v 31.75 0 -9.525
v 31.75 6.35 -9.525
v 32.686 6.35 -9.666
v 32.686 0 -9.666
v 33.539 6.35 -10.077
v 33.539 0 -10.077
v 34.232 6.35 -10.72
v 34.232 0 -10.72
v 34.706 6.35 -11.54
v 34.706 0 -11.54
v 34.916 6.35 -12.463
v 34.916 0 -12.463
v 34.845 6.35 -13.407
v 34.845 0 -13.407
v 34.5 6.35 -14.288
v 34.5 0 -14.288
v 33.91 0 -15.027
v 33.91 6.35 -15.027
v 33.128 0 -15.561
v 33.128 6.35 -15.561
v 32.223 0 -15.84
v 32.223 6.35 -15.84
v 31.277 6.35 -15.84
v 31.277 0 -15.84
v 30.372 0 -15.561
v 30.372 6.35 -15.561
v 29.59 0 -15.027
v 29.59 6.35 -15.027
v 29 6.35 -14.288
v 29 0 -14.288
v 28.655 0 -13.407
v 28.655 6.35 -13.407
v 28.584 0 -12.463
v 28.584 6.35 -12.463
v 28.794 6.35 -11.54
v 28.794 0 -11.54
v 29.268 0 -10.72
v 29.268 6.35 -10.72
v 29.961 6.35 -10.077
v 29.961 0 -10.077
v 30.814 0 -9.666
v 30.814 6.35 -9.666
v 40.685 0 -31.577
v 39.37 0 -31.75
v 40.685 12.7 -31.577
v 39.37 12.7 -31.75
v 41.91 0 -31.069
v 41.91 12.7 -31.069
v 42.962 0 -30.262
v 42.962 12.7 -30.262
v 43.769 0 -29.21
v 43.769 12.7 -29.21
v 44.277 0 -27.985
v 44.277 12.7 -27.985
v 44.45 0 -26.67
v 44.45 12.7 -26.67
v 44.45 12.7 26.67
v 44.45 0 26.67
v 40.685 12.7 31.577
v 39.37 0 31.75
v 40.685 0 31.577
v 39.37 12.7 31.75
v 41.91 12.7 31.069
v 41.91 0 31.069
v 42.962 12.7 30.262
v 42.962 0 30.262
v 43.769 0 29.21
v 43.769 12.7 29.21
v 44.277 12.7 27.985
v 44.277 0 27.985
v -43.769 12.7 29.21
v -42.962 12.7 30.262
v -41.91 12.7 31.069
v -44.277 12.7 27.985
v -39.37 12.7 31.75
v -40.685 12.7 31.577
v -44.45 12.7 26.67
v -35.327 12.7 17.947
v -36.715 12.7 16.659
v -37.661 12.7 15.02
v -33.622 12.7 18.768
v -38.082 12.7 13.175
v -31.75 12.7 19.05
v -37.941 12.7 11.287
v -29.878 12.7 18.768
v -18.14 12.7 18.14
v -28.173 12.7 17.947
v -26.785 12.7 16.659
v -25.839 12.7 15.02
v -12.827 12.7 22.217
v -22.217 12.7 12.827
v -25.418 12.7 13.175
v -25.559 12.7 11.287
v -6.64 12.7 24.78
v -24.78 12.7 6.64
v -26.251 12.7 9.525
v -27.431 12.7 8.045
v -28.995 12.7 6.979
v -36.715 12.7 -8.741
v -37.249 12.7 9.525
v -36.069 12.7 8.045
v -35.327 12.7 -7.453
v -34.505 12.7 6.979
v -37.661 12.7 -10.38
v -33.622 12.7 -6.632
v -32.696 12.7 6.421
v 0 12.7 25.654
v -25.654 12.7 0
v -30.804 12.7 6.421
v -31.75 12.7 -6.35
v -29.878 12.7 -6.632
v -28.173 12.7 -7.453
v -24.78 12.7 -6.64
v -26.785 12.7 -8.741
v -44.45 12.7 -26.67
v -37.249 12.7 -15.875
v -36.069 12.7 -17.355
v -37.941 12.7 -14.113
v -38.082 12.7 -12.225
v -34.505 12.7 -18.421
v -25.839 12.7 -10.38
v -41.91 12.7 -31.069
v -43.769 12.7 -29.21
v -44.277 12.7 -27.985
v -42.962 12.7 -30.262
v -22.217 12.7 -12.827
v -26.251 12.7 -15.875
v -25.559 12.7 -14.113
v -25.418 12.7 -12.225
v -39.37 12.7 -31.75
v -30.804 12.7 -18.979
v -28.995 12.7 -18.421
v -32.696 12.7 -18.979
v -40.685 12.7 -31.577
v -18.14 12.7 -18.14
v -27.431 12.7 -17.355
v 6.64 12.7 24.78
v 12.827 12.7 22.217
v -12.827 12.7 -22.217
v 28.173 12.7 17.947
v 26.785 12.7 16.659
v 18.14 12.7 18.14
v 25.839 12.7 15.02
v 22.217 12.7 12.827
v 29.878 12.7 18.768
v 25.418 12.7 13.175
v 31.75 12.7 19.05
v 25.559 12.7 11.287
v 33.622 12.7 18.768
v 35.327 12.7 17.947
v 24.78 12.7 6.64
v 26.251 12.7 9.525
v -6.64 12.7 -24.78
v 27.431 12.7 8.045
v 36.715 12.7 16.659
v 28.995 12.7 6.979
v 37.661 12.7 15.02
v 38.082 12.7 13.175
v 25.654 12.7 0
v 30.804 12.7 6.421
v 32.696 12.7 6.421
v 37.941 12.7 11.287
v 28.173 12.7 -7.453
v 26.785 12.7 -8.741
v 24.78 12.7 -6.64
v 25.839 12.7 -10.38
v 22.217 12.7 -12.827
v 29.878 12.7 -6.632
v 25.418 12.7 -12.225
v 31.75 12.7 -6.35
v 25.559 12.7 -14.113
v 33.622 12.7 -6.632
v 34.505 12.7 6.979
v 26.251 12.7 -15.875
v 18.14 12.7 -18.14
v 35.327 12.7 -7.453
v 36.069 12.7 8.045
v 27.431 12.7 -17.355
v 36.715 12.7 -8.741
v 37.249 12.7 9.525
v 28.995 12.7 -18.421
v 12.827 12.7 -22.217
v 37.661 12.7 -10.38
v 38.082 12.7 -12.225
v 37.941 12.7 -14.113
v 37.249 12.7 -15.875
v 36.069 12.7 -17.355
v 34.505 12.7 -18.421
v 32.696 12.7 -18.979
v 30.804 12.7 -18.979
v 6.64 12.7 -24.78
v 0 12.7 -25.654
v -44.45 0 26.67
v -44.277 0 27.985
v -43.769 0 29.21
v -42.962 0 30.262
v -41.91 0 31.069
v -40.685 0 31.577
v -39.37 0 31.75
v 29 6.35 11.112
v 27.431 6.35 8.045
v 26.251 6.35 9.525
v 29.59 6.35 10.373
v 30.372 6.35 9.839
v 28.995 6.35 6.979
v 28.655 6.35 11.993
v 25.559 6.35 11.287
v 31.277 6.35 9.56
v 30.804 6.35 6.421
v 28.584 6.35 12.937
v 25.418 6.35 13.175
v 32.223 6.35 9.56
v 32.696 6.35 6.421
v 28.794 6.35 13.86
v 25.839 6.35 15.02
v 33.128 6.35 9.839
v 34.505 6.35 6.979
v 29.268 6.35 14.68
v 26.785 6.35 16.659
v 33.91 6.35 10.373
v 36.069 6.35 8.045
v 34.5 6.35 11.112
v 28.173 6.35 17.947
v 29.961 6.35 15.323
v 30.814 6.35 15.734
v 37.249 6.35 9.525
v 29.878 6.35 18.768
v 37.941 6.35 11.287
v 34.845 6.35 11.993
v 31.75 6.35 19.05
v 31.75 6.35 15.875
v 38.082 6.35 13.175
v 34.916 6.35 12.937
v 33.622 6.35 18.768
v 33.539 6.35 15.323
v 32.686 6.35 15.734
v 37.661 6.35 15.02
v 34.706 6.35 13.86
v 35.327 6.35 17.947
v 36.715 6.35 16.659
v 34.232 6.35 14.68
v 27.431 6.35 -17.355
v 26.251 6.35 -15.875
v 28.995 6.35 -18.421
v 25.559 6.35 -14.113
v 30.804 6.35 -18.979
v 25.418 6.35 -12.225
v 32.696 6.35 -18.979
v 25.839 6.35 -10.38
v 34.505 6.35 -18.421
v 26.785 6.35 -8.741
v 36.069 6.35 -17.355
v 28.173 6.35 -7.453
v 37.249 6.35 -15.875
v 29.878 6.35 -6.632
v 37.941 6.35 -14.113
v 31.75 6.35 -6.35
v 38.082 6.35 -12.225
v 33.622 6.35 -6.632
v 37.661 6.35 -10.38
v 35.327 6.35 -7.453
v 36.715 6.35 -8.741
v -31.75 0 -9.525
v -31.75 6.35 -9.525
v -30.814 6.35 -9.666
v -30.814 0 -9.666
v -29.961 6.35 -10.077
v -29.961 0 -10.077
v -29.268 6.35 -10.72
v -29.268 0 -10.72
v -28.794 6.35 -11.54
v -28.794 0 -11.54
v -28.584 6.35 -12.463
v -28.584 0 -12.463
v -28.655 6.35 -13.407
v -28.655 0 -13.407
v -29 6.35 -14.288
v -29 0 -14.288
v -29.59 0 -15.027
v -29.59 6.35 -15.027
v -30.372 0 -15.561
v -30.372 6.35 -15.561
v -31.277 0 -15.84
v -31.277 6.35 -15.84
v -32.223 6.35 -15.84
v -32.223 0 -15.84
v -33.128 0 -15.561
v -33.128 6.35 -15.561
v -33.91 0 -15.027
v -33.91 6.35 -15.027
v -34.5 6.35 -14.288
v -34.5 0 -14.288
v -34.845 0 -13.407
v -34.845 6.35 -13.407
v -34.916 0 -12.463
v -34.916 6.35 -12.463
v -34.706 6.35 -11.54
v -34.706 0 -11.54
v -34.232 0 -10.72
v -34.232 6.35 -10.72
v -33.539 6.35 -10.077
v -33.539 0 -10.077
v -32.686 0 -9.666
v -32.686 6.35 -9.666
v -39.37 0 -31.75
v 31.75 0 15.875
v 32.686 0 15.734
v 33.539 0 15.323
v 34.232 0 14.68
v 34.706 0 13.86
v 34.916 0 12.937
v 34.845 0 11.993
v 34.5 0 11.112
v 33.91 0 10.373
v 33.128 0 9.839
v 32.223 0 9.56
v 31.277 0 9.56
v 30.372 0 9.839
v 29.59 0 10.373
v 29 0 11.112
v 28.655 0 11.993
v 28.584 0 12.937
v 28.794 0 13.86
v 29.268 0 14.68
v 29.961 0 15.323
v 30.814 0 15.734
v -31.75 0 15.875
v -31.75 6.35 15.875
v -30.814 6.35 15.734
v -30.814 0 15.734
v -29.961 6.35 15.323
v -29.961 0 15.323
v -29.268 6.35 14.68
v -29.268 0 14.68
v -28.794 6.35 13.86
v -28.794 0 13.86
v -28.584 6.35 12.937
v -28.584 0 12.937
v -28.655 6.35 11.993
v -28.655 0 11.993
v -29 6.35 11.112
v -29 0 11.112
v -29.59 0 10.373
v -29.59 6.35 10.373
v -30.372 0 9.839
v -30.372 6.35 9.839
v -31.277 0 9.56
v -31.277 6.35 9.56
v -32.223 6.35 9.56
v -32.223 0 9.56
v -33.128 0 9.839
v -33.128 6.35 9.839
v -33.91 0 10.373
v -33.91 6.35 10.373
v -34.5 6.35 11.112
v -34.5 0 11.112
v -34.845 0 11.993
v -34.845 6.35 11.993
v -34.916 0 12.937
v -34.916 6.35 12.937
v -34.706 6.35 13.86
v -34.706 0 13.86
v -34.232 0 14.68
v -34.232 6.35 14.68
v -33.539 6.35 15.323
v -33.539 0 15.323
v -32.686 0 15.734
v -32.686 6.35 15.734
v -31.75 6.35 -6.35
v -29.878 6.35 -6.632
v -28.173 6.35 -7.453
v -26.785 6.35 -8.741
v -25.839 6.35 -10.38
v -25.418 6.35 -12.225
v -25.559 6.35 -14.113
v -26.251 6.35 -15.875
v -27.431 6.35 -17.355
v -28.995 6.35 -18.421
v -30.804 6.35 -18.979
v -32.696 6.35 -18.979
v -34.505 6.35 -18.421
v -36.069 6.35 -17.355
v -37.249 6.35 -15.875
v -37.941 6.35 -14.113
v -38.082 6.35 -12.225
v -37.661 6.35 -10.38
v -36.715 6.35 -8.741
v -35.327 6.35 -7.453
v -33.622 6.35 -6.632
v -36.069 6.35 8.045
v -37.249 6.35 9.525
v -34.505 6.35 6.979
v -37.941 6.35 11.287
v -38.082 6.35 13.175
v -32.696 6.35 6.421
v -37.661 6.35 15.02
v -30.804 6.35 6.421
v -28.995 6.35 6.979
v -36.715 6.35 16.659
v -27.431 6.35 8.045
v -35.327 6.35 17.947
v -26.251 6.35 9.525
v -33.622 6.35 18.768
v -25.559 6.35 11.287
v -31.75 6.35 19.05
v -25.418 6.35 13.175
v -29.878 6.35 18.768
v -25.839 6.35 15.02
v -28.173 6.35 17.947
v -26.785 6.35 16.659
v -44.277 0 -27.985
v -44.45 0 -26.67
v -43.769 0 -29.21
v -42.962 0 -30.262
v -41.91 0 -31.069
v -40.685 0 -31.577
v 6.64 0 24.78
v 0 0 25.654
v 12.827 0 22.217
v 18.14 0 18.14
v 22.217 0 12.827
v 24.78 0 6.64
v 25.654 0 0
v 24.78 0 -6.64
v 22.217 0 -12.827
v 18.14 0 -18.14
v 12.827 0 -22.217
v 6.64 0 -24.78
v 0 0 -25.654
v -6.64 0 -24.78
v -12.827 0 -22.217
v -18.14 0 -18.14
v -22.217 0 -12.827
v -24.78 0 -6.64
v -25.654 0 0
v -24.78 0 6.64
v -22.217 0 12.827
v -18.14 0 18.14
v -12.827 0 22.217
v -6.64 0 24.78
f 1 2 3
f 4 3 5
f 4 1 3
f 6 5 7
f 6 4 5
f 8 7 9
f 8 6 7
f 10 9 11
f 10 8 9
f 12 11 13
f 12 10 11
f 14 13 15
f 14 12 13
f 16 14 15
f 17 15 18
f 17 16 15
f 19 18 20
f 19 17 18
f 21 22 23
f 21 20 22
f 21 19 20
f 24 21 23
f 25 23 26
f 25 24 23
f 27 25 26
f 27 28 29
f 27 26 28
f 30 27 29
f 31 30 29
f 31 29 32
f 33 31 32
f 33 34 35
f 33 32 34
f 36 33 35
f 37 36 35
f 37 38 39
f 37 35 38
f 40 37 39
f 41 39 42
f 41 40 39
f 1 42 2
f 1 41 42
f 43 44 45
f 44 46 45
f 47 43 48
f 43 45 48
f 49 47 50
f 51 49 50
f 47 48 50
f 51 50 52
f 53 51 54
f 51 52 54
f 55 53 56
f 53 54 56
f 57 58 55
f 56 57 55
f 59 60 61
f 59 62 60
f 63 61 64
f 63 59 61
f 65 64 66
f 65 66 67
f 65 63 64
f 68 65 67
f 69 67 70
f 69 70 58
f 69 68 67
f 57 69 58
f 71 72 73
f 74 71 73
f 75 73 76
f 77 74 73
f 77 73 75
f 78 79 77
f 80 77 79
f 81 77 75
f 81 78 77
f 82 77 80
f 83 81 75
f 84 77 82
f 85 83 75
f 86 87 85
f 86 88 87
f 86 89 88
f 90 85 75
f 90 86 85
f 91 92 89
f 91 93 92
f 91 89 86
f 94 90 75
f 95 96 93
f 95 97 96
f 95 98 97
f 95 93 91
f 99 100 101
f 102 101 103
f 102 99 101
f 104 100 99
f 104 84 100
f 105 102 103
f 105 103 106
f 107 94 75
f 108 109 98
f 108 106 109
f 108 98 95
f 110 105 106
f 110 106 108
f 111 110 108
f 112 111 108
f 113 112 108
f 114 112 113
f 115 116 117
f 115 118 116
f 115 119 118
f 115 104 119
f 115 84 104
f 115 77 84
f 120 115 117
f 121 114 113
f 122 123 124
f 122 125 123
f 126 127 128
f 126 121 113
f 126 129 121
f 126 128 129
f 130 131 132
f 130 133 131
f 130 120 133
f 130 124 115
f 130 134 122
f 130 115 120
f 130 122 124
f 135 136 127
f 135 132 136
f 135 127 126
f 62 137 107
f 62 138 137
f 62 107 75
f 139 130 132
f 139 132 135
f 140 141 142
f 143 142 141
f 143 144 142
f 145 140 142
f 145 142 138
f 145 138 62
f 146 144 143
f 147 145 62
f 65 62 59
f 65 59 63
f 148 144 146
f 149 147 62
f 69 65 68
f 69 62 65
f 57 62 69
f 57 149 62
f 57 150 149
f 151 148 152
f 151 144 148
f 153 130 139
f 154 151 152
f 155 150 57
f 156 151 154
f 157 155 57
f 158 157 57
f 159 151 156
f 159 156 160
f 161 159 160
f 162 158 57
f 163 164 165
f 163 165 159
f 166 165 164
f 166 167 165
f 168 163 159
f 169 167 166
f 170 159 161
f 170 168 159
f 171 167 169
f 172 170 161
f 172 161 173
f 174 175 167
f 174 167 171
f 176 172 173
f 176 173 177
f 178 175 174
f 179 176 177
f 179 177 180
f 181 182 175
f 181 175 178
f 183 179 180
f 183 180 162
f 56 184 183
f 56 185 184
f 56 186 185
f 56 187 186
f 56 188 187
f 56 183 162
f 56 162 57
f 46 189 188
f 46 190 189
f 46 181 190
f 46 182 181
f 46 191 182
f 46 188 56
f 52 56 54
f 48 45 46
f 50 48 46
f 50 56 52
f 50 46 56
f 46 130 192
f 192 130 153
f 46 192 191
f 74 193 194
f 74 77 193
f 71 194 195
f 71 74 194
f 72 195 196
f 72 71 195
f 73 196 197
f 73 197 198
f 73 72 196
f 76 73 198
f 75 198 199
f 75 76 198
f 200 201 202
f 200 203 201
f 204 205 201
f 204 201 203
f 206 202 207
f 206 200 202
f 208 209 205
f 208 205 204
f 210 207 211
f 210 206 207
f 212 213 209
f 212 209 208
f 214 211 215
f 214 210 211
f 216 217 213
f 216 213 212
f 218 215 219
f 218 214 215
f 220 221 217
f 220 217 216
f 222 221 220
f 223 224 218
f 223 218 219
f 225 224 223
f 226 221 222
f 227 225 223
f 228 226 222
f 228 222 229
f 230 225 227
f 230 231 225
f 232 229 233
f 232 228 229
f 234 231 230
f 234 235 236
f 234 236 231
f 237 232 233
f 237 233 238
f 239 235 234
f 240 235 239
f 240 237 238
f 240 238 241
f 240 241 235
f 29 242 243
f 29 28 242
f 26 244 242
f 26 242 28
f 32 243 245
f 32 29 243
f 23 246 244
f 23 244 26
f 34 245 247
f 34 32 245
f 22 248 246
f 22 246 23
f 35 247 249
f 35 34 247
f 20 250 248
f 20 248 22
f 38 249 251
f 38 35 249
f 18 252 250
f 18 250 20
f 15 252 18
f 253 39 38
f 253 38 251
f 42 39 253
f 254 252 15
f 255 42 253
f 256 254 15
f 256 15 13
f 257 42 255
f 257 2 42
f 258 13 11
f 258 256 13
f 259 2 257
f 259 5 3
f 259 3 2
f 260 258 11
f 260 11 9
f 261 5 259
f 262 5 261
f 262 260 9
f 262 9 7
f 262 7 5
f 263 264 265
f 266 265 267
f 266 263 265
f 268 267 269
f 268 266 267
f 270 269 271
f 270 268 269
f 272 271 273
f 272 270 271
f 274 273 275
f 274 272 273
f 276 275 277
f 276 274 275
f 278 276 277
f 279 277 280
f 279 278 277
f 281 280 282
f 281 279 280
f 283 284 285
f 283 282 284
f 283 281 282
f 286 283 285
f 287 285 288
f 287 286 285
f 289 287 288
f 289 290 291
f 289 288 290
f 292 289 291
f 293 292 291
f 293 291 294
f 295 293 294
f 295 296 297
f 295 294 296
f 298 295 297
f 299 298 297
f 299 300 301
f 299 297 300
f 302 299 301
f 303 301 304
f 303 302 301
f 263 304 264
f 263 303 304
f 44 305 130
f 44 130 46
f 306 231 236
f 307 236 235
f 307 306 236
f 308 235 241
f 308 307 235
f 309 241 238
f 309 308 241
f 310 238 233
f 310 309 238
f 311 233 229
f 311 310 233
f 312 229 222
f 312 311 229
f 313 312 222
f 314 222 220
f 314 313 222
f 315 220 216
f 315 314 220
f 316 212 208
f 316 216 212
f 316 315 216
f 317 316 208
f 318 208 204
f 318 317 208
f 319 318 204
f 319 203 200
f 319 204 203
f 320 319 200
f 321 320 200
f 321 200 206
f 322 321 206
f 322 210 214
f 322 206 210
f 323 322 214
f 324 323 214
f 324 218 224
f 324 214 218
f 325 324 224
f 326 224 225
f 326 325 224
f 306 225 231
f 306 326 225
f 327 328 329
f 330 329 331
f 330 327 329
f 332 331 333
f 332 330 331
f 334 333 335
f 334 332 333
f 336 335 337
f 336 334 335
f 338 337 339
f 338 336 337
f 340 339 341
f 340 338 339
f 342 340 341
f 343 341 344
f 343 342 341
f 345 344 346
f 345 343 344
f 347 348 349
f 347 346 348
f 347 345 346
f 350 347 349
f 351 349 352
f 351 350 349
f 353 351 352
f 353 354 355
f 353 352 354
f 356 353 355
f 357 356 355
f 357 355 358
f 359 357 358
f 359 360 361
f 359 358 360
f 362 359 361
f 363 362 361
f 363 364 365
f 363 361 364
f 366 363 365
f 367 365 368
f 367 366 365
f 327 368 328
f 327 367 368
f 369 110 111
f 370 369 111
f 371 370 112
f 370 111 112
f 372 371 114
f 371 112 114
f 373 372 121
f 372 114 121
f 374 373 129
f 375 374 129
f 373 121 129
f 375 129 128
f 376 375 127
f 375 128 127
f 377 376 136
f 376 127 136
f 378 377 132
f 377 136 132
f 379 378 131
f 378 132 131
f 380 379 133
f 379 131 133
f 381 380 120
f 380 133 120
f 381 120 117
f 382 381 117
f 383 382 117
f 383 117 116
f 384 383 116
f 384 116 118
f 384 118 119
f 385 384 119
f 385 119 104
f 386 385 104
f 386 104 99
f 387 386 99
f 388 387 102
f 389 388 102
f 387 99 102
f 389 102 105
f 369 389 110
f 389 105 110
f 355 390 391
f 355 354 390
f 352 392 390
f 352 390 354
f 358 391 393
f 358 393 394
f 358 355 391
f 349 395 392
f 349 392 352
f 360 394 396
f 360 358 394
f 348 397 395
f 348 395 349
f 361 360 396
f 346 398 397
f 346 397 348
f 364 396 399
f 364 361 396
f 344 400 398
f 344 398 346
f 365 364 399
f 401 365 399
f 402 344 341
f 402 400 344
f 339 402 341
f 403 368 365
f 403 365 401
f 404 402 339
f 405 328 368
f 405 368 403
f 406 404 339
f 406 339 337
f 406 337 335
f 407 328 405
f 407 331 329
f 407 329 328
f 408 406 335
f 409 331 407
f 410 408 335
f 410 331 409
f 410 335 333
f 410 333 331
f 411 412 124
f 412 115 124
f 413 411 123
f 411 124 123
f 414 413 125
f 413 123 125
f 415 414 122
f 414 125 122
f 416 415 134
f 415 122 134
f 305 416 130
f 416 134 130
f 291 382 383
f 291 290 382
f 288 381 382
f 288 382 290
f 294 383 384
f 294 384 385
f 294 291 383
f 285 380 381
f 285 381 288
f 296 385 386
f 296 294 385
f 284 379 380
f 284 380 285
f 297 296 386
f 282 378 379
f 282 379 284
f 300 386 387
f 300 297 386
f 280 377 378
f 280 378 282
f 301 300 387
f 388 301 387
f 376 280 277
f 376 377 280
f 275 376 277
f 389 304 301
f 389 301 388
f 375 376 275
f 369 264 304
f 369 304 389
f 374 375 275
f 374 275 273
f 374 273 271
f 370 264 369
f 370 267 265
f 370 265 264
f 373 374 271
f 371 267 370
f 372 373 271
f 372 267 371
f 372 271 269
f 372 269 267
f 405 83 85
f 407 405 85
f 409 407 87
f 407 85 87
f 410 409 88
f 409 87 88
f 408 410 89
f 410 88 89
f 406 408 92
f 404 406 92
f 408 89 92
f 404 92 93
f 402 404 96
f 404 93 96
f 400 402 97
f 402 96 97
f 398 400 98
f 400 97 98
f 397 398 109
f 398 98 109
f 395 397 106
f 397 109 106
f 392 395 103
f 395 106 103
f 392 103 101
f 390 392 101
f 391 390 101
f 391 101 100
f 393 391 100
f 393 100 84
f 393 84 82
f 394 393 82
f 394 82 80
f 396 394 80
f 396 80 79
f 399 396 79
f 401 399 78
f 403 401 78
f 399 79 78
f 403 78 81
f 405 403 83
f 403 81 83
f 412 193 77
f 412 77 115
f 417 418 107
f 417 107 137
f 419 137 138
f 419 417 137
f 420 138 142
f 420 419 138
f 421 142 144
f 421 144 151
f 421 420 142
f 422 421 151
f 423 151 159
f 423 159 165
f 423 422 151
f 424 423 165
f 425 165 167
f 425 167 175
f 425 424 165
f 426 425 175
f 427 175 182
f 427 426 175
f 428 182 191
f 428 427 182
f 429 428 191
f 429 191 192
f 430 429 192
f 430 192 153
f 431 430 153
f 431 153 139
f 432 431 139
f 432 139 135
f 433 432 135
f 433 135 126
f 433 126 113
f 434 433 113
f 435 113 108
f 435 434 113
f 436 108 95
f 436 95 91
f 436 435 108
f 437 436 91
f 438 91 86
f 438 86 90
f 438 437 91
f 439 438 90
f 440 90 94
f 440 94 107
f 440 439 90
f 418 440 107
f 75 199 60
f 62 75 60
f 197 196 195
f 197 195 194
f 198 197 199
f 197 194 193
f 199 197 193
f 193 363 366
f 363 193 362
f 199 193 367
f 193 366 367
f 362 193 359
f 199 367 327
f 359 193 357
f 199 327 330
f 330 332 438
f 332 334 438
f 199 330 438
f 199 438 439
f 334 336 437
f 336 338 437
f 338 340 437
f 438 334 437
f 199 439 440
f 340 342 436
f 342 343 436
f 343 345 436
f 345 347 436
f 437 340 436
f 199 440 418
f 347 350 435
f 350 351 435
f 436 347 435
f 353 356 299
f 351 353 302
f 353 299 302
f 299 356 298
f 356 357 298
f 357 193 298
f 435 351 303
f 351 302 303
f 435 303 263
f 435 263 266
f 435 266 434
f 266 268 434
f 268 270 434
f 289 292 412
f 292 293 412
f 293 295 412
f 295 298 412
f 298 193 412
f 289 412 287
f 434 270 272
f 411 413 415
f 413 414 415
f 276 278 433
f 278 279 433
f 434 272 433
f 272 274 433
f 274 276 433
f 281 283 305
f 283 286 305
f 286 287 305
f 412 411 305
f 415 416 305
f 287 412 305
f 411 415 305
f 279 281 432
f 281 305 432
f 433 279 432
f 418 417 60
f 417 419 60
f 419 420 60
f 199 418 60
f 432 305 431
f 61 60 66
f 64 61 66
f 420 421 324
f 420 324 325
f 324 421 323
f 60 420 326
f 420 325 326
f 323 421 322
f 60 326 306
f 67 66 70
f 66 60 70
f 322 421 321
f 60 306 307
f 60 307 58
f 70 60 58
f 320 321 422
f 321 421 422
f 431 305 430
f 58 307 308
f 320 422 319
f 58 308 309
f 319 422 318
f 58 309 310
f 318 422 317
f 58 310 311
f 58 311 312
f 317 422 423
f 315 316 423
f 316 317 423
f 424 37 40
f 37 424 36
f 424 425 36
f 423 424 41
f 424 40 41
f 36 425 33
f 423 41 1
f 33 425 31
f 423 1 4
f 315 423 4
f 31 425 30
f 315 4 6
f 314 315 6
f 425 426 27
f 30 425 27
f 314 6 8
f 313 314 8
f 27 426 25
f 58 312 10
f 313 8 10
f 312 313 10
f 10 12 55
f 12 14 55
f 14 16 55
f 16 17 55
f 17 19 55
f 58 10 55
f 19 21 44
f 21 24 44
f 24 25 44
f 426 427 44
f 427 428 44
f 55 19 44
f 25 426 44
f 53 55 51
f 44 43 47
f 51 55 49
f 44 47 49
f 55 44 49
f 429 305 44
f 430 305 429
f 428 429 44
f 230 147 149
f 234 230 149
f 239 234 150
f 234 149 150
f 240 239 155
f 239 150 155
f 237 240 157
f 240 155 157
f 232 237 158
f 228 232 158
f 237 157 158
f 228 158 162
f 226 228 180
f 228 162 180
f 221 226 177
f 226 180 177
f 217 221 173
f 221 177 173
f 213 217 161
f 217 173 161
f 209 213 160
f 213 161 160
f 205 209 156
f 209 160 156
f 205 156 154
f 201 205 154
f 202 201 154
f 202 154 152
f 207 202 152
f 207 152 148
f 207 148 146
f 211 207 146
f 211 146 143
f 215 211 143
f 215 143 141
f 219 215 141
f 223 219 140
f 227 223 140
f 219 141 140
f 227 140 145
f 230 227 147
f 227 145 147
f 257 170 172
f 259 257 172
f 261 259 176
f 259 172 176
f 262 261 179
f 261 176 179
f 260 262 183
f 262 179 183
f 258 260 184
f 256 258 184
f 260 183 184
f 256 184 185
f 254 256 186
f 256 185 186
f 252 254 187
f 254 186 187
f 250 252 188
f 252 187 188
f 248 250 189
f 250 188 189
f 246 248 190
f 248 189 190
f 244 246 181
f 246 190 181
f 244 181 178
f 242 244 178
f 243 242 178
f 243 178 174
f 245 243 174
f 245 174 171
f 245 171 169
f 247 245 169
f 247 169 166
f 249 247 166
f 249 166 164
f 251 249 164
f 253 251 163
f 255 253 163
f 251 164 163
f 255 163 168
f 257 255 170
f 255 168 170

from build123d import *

# Parameters (mm, degrees)
SKETCH1_W           = 88.9
SKETCH1_H           = 63.5
SKETCH1_R           = 25.654
SKETCH1_R_2         = 3.175
BOSS_EXTRUDE1_DEPTH = 12.7
FILLET1_R           = 5.08
SKETCH2_R           = 6.35
CUT_EXTRUDE1_DEPTH  = 6.35


with BuildPart() as part:
    # Sketch1 → Boss-Extrude1 (new body)
    with BuildSketch(Plane(origin=(0, 0, 0), x_dir=(1, 0, 0), z_dir=(0, 1, 0))):
        Rectangle(SKETCH1_W, SKETCH1_H)
        with Locations(Location((0, 0, 0), (0, 0, 270))):
            Circle(SKETCH1_R, mode=Mode.SUBTRACT)
        with Locations(Location((-31.75, 12.7, 0), (0, 0, 270))):
            Circle(SKETCH1_R_2, mode=Mode.SUBTRACT)
        with Locations(Location((-31.75, -12.7, 0), (0, 0, 270))):
            Circle(SKETCH1_R_2, mode=Mode.SUBTRACT)
        with Locations(Location((31.75, -12.7, 0), (0, 0, 270))):
            Circle(SKETCH1_R_2, mode=Mode.SUBTRACT)
        with Locations(Location((31.75, 12.7, 0), (0, 0, 270))):
            Circle(SKETCH1_R_2, mode=Mode.SUBTRACT)
    extrude(amount=BOSS_EXTRUDE1_DEPTH)

    # Fillet1
    fillet1_edges = [part.edges().sort_by_distance(p)[0] for p in [
        (44.45, 6.35, 31.75),
        (-44.45, 6.35, 31.75),
        (-44.45, 6.35, -31.75),
        (44.45, 6.35, -31.75),
    ]]
    fillet(fillet1_edges, radius=FILLET1_R)

    # Sketch2 → Cut-Extrude1 (cut)
    with BuildSketch(Plane(origin=(0, 12.7, 0), x_dir=(1, 0, 0), z_dir=(0, 1, 0))):
        with Locations(Location((-31.75, 12.7, 0), (0, 0, 270))):
            Circle(SKETCH2_R)
        with Locations(Location((-31.75, -12.7, 0), (0, 0, 270))):
            Circle(SKETCH2_R)
        with Locations(Location((31.75, -12.7, 0), (0, 0, 270))):
            Circle(SKETCH2_R)
        with Locations(Location((31.75, 12.7, 0), (0, 0, 270))):
            Circle(SKETCH2_R)
    extrude(amount=-CUT_EXTRUDE1_DEPTH, mode=Mode.SUBTRACT)


solid = part.part
